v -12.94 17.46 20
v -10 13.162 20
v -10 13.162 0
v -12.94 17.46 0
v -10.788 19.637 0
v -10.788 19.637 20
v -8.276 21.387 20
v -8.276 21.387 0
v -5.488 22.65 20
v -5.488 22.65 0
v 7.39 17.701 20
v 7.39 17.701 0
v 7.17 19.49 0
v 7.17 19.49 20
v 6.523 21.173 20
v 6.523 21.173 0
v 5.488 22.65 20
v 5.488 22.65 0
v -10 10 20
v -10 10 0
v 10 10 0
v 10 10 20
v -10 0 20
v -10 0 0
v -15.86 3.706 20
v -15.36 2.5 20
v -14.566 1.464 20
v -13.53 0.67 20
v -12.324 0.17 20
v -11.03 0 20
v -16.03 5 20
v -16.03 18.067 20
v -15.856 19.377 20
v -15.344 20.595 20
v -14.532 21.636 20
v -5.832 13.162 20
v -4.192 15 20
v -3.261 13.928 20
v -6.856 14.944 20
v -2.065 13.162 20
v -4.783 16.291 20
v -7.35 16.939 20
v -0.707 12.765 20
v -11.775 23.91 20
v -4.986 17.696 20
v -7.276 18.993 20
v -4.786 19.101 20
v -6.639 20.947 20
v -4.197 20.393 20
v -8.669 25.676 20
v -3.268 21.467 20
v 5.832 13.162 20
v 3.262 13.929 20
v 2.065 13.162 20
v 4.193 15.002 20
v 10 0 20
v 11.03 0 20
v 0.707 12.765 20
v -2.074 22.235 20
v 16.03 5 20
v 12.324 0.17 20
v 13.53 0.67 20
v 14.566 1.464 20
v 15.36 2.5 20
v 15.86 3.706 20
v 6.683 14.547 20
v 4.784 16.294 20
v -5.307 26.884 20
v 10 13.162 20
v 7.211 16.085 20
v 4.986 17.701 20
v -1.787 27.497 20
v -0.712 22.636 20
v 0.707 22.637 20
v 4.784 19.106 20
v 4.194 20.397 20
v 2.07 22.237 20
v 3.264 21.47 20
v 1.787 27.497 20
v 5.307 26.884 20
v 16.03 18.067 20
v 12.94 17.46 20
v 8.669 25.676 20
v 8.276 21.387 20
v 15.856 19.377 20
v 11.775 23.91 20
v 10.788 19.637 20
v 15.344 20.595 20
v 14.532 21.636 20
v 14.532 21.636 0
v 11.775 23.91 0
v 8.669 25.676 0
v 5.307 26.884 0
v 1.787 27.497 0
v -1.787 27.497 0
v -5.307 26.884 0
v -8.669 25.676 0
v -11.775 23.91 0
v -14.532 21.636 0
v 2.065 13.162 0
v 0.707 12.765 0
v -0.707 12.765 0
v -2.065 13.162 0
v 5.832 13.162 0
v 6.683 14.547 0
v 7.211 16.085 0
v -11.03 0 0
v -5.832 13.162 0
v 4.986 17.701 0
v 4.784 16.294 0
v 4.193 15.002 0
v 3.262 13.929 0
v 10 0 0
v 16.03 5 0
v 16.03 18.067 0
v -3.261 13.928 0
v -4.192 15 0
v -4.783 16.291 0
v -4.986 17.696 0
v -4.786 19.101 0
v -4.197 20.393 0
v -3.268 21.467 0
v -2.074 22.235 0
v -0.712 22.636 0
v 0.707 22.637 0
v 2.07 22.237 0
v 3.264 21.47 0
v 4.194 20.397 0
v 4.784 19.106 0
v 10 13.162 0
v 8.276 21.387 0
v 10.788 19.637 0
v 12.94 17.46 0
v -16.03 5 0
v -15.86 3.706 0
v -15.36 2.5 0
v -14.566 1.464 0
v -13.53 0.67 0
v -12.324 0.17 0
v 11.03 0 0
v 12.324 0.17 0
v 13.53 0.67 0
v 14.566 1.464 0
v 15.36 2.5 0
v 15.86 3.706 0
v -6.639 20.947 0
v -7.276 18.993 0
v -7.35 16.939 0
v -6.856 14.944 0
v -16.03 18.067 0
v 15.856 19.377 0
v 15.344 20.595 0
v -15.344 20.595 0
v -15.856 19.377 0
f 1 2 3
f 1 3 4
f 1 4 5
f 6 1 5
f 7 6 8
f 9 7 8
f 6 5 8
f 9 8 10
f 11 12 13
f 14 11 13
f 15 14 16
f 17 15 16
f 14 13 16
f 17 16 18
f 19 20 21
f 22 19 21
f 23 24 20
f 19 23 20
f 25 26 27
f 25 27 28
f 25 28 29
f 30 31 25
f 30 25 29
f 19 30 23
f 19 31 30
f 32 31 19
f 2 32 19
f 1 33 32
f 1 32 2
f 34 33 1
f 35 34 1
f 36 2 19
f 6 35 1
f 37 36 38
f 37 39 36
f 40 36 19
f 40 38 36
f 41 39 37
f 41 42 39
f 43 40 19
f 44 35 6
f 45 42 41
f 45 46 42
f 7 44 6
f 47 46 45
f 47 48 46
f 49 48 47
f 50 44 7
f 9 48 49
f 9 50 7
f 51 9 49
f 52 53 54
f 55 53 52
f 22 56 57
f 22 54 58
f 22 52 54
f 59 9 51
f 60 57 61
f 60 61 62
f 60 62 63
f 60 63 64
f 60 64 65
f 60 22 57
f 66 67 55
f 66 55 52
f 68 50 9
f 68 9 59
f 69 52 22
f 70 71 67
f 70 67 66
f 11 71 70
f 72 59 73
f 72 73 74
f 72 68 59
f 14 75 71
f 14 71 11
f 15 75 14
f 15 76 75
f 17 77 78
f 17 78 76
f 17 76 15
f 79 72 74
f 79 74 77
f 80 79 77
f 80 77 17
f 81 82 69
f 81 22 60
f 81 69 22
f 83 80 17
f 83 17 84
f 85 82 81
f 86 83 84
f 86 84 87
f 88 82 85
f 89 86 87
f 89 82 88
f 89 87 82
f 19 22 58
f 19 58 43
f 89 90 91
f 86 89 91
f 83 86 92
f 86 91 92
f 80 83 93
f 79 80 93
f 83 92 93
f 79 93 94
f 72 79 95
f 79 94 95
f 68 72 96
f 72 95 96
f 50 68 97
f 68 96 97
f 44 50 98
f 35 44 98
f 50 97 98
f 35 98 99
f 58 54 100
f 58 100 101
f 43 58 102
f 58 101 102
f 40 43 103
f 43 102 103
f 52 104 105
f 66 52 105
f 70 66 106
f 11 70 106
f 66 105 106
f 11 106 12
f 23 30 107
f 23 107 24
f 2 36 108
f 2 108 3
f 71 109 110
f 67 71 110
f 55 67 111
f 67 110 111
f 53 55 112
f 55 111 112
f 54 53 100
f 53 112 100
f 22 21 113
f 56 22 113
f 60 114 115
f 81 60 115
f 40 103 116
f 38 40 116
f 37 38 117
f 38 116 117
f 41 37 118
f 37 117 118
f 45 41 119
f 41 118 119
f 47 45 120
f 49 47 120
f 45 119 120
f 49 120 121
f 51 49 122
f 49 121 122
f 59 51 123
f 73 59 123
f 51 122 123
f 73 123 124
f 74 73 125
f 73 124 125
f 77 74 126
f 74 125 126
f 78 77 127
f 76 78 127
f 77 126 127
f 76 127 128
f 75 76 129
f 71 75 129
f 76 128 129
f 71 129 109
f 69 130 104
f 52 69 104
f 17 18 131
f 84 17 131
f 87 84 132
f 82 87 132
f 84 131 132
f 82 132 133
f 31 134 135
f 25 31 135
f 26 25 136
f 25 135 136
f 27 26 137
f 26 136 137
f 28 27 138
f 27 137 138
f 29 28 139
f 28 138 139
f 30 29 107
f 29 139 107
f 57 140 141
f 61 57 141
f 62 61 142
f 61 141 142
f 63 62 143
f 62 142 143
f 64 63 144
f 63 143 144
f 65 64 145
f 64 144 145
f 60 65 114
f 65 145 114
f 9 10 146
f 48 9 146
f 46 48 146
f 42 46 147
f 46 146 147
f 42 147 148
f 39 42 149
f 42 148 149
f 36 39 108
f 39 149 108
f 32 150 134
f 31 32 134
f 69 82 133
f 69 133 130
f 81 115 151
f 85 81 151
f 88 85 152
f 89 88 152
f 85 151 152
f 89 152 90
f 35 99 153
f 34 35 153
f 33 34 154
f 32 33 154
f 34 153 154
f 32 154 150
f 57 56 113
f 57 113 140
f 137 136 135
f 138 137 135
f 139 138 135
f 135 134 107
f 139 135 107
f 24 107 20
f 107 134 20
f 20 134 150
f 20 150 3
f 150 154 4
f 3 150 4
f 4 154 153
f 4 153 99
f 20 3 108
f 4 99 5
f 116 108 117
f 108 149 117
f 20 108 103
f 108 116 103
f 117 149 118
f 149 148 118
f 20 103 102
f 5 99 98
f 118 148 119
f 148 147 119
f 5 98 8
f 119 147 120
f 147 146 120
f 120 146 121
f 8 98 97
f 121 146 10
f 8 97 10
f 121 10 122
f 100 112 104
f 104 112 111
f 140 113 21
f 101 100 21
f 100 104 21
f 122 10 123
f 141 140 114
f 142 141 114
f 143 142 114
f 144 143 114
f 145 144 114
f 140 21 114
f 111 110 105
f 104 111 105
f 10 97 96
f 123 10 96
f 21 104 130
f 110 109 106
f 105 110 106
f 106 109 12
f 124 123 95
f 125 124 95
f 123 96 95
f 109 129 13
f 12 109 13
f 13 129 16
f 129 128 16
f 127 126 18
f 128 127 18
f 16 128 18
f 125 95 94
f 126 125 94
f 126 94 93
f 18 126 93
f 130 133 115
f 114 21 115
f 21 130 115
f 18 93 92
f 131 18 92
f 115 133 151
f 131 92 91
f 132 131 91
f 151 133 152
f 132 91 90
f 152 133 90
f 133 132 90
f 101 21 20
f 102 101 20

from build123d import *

# Parameters (mm, degrees)
F1_DEPTH = 20


with BuildPart() as f1:
    # F0 (on Top) → F1 (new body)
    with BuildSketch(Plane.XY):
        with BuildLine():
            Line((10, 10), (10, 0))
            Line((10, 0), (11.03011, 0))
            ThreePointArc((11.03011, 0), (14.565644, 1.464466), (16.03011, 5))
            Line((16.03011, 5), (16.03011, 18.067016))
            ThreePointArc((16.03011, 18.067016), (15.640302, 20.00251), (14.531656, 21.636215))
            ThreePointArc((14.531656, 21.636215), (0, 27.574139), (-14.531656, 21.636215))
            ThreePointArc((-14.531656, 21.636215), (-15.640302, 20.00251), (-16.03011, 18.067016))
            Line((-16.03011, 18.067016), (-16.03011, 5))
            ThreePointArc((-16.03011, 5), (-14.565644, 1.464466), (-11.03011, 0))
            Line((-11.03011, 0), (-10, 0))
            Line((-10, 0), (-10, 10))
            Line((-10, 10), (10, 10))
        make_face()
        with BuildLine():
            ThreePointArc((5.831695, 13.162136), (0, 10.311049), (-5.831695, 13.162136))
            Line((-5.831695, 13.162136), (-10, 13.162136))
            Line((-10, 13.162136), (-12.94002, 17.460051))
            ThreePointArc((-12.94002, 17.460051), (-9.572312, 20.569517), (-5.487801, 22.649662))
            ThreePointArc((-5.487801, 22.649662), (0, 25.090452), (5.487801, 22.649662))
            ThreePointArc((5.487801, 22.649662), (9.572312, 20.569517), (12.94002, 17.460051))
            Line((12.94002, 17.460051), (10, 13.162136))
            Line((10, 13.162136), (5.831695, 13.162136))
        make_face(mode=Mode.SUBTRACT)
        with BuildLine():
            ThreePointArc((2.065368, 13.162136), (0, 12.714292), (-2.065368, 13.162136))
            Line((-2.065368, 13.162136), (-5.831695, 13.162136))
            ThreePointArc((-5.831695, 13.162136), (0, 10.311049), (5.831695, 13.162136))
            Line((5.831695, 13.162136), (2.065368, 13.162136))
        make_face()
        with BuildLine():
            ThreePointArc((5.487801, 22.649662), (0, 25.090452), (-5.487801, 22.649662))
            ThreePointArc((-5.487801, 22.649662), (0, 23.574139), (5.487801, 22.649662))
        make_face()
        with BuildLine():
            ThreePointArc((-2.065368, 13.162136), (-2.698694, 21.893818), (4.986458, 17.70075))
            ThreePointArc((4.986458, 17.70075), (4.193068, 15.002057), (2.065368, 13.162136))
            Line((2.065368, 13.162136), (5.831695, 13.162136))
            ThreePointArc((5.831695, 13.162136), (6.989355, 15.301459), (7.389702, 17.70075))
            ThreePointArc((7.389702, 17.70075), (6.897858, 20.351644), (5.487801, 22.649662))
            ThreePointArc((5.487801, 22.649662), (0, 23.574139), (-5.487801, 22.649662))
            ThreePointArc((-5.487801, 22.649662), (-7.384852, 17.968429), (-5.831695, 13.162136))
            Line((-5.831695, 13.162136), (-2.065368, 13.162136))
        make_face()
    extrude(amount=F1_DEPTH)


solid = f1.part
